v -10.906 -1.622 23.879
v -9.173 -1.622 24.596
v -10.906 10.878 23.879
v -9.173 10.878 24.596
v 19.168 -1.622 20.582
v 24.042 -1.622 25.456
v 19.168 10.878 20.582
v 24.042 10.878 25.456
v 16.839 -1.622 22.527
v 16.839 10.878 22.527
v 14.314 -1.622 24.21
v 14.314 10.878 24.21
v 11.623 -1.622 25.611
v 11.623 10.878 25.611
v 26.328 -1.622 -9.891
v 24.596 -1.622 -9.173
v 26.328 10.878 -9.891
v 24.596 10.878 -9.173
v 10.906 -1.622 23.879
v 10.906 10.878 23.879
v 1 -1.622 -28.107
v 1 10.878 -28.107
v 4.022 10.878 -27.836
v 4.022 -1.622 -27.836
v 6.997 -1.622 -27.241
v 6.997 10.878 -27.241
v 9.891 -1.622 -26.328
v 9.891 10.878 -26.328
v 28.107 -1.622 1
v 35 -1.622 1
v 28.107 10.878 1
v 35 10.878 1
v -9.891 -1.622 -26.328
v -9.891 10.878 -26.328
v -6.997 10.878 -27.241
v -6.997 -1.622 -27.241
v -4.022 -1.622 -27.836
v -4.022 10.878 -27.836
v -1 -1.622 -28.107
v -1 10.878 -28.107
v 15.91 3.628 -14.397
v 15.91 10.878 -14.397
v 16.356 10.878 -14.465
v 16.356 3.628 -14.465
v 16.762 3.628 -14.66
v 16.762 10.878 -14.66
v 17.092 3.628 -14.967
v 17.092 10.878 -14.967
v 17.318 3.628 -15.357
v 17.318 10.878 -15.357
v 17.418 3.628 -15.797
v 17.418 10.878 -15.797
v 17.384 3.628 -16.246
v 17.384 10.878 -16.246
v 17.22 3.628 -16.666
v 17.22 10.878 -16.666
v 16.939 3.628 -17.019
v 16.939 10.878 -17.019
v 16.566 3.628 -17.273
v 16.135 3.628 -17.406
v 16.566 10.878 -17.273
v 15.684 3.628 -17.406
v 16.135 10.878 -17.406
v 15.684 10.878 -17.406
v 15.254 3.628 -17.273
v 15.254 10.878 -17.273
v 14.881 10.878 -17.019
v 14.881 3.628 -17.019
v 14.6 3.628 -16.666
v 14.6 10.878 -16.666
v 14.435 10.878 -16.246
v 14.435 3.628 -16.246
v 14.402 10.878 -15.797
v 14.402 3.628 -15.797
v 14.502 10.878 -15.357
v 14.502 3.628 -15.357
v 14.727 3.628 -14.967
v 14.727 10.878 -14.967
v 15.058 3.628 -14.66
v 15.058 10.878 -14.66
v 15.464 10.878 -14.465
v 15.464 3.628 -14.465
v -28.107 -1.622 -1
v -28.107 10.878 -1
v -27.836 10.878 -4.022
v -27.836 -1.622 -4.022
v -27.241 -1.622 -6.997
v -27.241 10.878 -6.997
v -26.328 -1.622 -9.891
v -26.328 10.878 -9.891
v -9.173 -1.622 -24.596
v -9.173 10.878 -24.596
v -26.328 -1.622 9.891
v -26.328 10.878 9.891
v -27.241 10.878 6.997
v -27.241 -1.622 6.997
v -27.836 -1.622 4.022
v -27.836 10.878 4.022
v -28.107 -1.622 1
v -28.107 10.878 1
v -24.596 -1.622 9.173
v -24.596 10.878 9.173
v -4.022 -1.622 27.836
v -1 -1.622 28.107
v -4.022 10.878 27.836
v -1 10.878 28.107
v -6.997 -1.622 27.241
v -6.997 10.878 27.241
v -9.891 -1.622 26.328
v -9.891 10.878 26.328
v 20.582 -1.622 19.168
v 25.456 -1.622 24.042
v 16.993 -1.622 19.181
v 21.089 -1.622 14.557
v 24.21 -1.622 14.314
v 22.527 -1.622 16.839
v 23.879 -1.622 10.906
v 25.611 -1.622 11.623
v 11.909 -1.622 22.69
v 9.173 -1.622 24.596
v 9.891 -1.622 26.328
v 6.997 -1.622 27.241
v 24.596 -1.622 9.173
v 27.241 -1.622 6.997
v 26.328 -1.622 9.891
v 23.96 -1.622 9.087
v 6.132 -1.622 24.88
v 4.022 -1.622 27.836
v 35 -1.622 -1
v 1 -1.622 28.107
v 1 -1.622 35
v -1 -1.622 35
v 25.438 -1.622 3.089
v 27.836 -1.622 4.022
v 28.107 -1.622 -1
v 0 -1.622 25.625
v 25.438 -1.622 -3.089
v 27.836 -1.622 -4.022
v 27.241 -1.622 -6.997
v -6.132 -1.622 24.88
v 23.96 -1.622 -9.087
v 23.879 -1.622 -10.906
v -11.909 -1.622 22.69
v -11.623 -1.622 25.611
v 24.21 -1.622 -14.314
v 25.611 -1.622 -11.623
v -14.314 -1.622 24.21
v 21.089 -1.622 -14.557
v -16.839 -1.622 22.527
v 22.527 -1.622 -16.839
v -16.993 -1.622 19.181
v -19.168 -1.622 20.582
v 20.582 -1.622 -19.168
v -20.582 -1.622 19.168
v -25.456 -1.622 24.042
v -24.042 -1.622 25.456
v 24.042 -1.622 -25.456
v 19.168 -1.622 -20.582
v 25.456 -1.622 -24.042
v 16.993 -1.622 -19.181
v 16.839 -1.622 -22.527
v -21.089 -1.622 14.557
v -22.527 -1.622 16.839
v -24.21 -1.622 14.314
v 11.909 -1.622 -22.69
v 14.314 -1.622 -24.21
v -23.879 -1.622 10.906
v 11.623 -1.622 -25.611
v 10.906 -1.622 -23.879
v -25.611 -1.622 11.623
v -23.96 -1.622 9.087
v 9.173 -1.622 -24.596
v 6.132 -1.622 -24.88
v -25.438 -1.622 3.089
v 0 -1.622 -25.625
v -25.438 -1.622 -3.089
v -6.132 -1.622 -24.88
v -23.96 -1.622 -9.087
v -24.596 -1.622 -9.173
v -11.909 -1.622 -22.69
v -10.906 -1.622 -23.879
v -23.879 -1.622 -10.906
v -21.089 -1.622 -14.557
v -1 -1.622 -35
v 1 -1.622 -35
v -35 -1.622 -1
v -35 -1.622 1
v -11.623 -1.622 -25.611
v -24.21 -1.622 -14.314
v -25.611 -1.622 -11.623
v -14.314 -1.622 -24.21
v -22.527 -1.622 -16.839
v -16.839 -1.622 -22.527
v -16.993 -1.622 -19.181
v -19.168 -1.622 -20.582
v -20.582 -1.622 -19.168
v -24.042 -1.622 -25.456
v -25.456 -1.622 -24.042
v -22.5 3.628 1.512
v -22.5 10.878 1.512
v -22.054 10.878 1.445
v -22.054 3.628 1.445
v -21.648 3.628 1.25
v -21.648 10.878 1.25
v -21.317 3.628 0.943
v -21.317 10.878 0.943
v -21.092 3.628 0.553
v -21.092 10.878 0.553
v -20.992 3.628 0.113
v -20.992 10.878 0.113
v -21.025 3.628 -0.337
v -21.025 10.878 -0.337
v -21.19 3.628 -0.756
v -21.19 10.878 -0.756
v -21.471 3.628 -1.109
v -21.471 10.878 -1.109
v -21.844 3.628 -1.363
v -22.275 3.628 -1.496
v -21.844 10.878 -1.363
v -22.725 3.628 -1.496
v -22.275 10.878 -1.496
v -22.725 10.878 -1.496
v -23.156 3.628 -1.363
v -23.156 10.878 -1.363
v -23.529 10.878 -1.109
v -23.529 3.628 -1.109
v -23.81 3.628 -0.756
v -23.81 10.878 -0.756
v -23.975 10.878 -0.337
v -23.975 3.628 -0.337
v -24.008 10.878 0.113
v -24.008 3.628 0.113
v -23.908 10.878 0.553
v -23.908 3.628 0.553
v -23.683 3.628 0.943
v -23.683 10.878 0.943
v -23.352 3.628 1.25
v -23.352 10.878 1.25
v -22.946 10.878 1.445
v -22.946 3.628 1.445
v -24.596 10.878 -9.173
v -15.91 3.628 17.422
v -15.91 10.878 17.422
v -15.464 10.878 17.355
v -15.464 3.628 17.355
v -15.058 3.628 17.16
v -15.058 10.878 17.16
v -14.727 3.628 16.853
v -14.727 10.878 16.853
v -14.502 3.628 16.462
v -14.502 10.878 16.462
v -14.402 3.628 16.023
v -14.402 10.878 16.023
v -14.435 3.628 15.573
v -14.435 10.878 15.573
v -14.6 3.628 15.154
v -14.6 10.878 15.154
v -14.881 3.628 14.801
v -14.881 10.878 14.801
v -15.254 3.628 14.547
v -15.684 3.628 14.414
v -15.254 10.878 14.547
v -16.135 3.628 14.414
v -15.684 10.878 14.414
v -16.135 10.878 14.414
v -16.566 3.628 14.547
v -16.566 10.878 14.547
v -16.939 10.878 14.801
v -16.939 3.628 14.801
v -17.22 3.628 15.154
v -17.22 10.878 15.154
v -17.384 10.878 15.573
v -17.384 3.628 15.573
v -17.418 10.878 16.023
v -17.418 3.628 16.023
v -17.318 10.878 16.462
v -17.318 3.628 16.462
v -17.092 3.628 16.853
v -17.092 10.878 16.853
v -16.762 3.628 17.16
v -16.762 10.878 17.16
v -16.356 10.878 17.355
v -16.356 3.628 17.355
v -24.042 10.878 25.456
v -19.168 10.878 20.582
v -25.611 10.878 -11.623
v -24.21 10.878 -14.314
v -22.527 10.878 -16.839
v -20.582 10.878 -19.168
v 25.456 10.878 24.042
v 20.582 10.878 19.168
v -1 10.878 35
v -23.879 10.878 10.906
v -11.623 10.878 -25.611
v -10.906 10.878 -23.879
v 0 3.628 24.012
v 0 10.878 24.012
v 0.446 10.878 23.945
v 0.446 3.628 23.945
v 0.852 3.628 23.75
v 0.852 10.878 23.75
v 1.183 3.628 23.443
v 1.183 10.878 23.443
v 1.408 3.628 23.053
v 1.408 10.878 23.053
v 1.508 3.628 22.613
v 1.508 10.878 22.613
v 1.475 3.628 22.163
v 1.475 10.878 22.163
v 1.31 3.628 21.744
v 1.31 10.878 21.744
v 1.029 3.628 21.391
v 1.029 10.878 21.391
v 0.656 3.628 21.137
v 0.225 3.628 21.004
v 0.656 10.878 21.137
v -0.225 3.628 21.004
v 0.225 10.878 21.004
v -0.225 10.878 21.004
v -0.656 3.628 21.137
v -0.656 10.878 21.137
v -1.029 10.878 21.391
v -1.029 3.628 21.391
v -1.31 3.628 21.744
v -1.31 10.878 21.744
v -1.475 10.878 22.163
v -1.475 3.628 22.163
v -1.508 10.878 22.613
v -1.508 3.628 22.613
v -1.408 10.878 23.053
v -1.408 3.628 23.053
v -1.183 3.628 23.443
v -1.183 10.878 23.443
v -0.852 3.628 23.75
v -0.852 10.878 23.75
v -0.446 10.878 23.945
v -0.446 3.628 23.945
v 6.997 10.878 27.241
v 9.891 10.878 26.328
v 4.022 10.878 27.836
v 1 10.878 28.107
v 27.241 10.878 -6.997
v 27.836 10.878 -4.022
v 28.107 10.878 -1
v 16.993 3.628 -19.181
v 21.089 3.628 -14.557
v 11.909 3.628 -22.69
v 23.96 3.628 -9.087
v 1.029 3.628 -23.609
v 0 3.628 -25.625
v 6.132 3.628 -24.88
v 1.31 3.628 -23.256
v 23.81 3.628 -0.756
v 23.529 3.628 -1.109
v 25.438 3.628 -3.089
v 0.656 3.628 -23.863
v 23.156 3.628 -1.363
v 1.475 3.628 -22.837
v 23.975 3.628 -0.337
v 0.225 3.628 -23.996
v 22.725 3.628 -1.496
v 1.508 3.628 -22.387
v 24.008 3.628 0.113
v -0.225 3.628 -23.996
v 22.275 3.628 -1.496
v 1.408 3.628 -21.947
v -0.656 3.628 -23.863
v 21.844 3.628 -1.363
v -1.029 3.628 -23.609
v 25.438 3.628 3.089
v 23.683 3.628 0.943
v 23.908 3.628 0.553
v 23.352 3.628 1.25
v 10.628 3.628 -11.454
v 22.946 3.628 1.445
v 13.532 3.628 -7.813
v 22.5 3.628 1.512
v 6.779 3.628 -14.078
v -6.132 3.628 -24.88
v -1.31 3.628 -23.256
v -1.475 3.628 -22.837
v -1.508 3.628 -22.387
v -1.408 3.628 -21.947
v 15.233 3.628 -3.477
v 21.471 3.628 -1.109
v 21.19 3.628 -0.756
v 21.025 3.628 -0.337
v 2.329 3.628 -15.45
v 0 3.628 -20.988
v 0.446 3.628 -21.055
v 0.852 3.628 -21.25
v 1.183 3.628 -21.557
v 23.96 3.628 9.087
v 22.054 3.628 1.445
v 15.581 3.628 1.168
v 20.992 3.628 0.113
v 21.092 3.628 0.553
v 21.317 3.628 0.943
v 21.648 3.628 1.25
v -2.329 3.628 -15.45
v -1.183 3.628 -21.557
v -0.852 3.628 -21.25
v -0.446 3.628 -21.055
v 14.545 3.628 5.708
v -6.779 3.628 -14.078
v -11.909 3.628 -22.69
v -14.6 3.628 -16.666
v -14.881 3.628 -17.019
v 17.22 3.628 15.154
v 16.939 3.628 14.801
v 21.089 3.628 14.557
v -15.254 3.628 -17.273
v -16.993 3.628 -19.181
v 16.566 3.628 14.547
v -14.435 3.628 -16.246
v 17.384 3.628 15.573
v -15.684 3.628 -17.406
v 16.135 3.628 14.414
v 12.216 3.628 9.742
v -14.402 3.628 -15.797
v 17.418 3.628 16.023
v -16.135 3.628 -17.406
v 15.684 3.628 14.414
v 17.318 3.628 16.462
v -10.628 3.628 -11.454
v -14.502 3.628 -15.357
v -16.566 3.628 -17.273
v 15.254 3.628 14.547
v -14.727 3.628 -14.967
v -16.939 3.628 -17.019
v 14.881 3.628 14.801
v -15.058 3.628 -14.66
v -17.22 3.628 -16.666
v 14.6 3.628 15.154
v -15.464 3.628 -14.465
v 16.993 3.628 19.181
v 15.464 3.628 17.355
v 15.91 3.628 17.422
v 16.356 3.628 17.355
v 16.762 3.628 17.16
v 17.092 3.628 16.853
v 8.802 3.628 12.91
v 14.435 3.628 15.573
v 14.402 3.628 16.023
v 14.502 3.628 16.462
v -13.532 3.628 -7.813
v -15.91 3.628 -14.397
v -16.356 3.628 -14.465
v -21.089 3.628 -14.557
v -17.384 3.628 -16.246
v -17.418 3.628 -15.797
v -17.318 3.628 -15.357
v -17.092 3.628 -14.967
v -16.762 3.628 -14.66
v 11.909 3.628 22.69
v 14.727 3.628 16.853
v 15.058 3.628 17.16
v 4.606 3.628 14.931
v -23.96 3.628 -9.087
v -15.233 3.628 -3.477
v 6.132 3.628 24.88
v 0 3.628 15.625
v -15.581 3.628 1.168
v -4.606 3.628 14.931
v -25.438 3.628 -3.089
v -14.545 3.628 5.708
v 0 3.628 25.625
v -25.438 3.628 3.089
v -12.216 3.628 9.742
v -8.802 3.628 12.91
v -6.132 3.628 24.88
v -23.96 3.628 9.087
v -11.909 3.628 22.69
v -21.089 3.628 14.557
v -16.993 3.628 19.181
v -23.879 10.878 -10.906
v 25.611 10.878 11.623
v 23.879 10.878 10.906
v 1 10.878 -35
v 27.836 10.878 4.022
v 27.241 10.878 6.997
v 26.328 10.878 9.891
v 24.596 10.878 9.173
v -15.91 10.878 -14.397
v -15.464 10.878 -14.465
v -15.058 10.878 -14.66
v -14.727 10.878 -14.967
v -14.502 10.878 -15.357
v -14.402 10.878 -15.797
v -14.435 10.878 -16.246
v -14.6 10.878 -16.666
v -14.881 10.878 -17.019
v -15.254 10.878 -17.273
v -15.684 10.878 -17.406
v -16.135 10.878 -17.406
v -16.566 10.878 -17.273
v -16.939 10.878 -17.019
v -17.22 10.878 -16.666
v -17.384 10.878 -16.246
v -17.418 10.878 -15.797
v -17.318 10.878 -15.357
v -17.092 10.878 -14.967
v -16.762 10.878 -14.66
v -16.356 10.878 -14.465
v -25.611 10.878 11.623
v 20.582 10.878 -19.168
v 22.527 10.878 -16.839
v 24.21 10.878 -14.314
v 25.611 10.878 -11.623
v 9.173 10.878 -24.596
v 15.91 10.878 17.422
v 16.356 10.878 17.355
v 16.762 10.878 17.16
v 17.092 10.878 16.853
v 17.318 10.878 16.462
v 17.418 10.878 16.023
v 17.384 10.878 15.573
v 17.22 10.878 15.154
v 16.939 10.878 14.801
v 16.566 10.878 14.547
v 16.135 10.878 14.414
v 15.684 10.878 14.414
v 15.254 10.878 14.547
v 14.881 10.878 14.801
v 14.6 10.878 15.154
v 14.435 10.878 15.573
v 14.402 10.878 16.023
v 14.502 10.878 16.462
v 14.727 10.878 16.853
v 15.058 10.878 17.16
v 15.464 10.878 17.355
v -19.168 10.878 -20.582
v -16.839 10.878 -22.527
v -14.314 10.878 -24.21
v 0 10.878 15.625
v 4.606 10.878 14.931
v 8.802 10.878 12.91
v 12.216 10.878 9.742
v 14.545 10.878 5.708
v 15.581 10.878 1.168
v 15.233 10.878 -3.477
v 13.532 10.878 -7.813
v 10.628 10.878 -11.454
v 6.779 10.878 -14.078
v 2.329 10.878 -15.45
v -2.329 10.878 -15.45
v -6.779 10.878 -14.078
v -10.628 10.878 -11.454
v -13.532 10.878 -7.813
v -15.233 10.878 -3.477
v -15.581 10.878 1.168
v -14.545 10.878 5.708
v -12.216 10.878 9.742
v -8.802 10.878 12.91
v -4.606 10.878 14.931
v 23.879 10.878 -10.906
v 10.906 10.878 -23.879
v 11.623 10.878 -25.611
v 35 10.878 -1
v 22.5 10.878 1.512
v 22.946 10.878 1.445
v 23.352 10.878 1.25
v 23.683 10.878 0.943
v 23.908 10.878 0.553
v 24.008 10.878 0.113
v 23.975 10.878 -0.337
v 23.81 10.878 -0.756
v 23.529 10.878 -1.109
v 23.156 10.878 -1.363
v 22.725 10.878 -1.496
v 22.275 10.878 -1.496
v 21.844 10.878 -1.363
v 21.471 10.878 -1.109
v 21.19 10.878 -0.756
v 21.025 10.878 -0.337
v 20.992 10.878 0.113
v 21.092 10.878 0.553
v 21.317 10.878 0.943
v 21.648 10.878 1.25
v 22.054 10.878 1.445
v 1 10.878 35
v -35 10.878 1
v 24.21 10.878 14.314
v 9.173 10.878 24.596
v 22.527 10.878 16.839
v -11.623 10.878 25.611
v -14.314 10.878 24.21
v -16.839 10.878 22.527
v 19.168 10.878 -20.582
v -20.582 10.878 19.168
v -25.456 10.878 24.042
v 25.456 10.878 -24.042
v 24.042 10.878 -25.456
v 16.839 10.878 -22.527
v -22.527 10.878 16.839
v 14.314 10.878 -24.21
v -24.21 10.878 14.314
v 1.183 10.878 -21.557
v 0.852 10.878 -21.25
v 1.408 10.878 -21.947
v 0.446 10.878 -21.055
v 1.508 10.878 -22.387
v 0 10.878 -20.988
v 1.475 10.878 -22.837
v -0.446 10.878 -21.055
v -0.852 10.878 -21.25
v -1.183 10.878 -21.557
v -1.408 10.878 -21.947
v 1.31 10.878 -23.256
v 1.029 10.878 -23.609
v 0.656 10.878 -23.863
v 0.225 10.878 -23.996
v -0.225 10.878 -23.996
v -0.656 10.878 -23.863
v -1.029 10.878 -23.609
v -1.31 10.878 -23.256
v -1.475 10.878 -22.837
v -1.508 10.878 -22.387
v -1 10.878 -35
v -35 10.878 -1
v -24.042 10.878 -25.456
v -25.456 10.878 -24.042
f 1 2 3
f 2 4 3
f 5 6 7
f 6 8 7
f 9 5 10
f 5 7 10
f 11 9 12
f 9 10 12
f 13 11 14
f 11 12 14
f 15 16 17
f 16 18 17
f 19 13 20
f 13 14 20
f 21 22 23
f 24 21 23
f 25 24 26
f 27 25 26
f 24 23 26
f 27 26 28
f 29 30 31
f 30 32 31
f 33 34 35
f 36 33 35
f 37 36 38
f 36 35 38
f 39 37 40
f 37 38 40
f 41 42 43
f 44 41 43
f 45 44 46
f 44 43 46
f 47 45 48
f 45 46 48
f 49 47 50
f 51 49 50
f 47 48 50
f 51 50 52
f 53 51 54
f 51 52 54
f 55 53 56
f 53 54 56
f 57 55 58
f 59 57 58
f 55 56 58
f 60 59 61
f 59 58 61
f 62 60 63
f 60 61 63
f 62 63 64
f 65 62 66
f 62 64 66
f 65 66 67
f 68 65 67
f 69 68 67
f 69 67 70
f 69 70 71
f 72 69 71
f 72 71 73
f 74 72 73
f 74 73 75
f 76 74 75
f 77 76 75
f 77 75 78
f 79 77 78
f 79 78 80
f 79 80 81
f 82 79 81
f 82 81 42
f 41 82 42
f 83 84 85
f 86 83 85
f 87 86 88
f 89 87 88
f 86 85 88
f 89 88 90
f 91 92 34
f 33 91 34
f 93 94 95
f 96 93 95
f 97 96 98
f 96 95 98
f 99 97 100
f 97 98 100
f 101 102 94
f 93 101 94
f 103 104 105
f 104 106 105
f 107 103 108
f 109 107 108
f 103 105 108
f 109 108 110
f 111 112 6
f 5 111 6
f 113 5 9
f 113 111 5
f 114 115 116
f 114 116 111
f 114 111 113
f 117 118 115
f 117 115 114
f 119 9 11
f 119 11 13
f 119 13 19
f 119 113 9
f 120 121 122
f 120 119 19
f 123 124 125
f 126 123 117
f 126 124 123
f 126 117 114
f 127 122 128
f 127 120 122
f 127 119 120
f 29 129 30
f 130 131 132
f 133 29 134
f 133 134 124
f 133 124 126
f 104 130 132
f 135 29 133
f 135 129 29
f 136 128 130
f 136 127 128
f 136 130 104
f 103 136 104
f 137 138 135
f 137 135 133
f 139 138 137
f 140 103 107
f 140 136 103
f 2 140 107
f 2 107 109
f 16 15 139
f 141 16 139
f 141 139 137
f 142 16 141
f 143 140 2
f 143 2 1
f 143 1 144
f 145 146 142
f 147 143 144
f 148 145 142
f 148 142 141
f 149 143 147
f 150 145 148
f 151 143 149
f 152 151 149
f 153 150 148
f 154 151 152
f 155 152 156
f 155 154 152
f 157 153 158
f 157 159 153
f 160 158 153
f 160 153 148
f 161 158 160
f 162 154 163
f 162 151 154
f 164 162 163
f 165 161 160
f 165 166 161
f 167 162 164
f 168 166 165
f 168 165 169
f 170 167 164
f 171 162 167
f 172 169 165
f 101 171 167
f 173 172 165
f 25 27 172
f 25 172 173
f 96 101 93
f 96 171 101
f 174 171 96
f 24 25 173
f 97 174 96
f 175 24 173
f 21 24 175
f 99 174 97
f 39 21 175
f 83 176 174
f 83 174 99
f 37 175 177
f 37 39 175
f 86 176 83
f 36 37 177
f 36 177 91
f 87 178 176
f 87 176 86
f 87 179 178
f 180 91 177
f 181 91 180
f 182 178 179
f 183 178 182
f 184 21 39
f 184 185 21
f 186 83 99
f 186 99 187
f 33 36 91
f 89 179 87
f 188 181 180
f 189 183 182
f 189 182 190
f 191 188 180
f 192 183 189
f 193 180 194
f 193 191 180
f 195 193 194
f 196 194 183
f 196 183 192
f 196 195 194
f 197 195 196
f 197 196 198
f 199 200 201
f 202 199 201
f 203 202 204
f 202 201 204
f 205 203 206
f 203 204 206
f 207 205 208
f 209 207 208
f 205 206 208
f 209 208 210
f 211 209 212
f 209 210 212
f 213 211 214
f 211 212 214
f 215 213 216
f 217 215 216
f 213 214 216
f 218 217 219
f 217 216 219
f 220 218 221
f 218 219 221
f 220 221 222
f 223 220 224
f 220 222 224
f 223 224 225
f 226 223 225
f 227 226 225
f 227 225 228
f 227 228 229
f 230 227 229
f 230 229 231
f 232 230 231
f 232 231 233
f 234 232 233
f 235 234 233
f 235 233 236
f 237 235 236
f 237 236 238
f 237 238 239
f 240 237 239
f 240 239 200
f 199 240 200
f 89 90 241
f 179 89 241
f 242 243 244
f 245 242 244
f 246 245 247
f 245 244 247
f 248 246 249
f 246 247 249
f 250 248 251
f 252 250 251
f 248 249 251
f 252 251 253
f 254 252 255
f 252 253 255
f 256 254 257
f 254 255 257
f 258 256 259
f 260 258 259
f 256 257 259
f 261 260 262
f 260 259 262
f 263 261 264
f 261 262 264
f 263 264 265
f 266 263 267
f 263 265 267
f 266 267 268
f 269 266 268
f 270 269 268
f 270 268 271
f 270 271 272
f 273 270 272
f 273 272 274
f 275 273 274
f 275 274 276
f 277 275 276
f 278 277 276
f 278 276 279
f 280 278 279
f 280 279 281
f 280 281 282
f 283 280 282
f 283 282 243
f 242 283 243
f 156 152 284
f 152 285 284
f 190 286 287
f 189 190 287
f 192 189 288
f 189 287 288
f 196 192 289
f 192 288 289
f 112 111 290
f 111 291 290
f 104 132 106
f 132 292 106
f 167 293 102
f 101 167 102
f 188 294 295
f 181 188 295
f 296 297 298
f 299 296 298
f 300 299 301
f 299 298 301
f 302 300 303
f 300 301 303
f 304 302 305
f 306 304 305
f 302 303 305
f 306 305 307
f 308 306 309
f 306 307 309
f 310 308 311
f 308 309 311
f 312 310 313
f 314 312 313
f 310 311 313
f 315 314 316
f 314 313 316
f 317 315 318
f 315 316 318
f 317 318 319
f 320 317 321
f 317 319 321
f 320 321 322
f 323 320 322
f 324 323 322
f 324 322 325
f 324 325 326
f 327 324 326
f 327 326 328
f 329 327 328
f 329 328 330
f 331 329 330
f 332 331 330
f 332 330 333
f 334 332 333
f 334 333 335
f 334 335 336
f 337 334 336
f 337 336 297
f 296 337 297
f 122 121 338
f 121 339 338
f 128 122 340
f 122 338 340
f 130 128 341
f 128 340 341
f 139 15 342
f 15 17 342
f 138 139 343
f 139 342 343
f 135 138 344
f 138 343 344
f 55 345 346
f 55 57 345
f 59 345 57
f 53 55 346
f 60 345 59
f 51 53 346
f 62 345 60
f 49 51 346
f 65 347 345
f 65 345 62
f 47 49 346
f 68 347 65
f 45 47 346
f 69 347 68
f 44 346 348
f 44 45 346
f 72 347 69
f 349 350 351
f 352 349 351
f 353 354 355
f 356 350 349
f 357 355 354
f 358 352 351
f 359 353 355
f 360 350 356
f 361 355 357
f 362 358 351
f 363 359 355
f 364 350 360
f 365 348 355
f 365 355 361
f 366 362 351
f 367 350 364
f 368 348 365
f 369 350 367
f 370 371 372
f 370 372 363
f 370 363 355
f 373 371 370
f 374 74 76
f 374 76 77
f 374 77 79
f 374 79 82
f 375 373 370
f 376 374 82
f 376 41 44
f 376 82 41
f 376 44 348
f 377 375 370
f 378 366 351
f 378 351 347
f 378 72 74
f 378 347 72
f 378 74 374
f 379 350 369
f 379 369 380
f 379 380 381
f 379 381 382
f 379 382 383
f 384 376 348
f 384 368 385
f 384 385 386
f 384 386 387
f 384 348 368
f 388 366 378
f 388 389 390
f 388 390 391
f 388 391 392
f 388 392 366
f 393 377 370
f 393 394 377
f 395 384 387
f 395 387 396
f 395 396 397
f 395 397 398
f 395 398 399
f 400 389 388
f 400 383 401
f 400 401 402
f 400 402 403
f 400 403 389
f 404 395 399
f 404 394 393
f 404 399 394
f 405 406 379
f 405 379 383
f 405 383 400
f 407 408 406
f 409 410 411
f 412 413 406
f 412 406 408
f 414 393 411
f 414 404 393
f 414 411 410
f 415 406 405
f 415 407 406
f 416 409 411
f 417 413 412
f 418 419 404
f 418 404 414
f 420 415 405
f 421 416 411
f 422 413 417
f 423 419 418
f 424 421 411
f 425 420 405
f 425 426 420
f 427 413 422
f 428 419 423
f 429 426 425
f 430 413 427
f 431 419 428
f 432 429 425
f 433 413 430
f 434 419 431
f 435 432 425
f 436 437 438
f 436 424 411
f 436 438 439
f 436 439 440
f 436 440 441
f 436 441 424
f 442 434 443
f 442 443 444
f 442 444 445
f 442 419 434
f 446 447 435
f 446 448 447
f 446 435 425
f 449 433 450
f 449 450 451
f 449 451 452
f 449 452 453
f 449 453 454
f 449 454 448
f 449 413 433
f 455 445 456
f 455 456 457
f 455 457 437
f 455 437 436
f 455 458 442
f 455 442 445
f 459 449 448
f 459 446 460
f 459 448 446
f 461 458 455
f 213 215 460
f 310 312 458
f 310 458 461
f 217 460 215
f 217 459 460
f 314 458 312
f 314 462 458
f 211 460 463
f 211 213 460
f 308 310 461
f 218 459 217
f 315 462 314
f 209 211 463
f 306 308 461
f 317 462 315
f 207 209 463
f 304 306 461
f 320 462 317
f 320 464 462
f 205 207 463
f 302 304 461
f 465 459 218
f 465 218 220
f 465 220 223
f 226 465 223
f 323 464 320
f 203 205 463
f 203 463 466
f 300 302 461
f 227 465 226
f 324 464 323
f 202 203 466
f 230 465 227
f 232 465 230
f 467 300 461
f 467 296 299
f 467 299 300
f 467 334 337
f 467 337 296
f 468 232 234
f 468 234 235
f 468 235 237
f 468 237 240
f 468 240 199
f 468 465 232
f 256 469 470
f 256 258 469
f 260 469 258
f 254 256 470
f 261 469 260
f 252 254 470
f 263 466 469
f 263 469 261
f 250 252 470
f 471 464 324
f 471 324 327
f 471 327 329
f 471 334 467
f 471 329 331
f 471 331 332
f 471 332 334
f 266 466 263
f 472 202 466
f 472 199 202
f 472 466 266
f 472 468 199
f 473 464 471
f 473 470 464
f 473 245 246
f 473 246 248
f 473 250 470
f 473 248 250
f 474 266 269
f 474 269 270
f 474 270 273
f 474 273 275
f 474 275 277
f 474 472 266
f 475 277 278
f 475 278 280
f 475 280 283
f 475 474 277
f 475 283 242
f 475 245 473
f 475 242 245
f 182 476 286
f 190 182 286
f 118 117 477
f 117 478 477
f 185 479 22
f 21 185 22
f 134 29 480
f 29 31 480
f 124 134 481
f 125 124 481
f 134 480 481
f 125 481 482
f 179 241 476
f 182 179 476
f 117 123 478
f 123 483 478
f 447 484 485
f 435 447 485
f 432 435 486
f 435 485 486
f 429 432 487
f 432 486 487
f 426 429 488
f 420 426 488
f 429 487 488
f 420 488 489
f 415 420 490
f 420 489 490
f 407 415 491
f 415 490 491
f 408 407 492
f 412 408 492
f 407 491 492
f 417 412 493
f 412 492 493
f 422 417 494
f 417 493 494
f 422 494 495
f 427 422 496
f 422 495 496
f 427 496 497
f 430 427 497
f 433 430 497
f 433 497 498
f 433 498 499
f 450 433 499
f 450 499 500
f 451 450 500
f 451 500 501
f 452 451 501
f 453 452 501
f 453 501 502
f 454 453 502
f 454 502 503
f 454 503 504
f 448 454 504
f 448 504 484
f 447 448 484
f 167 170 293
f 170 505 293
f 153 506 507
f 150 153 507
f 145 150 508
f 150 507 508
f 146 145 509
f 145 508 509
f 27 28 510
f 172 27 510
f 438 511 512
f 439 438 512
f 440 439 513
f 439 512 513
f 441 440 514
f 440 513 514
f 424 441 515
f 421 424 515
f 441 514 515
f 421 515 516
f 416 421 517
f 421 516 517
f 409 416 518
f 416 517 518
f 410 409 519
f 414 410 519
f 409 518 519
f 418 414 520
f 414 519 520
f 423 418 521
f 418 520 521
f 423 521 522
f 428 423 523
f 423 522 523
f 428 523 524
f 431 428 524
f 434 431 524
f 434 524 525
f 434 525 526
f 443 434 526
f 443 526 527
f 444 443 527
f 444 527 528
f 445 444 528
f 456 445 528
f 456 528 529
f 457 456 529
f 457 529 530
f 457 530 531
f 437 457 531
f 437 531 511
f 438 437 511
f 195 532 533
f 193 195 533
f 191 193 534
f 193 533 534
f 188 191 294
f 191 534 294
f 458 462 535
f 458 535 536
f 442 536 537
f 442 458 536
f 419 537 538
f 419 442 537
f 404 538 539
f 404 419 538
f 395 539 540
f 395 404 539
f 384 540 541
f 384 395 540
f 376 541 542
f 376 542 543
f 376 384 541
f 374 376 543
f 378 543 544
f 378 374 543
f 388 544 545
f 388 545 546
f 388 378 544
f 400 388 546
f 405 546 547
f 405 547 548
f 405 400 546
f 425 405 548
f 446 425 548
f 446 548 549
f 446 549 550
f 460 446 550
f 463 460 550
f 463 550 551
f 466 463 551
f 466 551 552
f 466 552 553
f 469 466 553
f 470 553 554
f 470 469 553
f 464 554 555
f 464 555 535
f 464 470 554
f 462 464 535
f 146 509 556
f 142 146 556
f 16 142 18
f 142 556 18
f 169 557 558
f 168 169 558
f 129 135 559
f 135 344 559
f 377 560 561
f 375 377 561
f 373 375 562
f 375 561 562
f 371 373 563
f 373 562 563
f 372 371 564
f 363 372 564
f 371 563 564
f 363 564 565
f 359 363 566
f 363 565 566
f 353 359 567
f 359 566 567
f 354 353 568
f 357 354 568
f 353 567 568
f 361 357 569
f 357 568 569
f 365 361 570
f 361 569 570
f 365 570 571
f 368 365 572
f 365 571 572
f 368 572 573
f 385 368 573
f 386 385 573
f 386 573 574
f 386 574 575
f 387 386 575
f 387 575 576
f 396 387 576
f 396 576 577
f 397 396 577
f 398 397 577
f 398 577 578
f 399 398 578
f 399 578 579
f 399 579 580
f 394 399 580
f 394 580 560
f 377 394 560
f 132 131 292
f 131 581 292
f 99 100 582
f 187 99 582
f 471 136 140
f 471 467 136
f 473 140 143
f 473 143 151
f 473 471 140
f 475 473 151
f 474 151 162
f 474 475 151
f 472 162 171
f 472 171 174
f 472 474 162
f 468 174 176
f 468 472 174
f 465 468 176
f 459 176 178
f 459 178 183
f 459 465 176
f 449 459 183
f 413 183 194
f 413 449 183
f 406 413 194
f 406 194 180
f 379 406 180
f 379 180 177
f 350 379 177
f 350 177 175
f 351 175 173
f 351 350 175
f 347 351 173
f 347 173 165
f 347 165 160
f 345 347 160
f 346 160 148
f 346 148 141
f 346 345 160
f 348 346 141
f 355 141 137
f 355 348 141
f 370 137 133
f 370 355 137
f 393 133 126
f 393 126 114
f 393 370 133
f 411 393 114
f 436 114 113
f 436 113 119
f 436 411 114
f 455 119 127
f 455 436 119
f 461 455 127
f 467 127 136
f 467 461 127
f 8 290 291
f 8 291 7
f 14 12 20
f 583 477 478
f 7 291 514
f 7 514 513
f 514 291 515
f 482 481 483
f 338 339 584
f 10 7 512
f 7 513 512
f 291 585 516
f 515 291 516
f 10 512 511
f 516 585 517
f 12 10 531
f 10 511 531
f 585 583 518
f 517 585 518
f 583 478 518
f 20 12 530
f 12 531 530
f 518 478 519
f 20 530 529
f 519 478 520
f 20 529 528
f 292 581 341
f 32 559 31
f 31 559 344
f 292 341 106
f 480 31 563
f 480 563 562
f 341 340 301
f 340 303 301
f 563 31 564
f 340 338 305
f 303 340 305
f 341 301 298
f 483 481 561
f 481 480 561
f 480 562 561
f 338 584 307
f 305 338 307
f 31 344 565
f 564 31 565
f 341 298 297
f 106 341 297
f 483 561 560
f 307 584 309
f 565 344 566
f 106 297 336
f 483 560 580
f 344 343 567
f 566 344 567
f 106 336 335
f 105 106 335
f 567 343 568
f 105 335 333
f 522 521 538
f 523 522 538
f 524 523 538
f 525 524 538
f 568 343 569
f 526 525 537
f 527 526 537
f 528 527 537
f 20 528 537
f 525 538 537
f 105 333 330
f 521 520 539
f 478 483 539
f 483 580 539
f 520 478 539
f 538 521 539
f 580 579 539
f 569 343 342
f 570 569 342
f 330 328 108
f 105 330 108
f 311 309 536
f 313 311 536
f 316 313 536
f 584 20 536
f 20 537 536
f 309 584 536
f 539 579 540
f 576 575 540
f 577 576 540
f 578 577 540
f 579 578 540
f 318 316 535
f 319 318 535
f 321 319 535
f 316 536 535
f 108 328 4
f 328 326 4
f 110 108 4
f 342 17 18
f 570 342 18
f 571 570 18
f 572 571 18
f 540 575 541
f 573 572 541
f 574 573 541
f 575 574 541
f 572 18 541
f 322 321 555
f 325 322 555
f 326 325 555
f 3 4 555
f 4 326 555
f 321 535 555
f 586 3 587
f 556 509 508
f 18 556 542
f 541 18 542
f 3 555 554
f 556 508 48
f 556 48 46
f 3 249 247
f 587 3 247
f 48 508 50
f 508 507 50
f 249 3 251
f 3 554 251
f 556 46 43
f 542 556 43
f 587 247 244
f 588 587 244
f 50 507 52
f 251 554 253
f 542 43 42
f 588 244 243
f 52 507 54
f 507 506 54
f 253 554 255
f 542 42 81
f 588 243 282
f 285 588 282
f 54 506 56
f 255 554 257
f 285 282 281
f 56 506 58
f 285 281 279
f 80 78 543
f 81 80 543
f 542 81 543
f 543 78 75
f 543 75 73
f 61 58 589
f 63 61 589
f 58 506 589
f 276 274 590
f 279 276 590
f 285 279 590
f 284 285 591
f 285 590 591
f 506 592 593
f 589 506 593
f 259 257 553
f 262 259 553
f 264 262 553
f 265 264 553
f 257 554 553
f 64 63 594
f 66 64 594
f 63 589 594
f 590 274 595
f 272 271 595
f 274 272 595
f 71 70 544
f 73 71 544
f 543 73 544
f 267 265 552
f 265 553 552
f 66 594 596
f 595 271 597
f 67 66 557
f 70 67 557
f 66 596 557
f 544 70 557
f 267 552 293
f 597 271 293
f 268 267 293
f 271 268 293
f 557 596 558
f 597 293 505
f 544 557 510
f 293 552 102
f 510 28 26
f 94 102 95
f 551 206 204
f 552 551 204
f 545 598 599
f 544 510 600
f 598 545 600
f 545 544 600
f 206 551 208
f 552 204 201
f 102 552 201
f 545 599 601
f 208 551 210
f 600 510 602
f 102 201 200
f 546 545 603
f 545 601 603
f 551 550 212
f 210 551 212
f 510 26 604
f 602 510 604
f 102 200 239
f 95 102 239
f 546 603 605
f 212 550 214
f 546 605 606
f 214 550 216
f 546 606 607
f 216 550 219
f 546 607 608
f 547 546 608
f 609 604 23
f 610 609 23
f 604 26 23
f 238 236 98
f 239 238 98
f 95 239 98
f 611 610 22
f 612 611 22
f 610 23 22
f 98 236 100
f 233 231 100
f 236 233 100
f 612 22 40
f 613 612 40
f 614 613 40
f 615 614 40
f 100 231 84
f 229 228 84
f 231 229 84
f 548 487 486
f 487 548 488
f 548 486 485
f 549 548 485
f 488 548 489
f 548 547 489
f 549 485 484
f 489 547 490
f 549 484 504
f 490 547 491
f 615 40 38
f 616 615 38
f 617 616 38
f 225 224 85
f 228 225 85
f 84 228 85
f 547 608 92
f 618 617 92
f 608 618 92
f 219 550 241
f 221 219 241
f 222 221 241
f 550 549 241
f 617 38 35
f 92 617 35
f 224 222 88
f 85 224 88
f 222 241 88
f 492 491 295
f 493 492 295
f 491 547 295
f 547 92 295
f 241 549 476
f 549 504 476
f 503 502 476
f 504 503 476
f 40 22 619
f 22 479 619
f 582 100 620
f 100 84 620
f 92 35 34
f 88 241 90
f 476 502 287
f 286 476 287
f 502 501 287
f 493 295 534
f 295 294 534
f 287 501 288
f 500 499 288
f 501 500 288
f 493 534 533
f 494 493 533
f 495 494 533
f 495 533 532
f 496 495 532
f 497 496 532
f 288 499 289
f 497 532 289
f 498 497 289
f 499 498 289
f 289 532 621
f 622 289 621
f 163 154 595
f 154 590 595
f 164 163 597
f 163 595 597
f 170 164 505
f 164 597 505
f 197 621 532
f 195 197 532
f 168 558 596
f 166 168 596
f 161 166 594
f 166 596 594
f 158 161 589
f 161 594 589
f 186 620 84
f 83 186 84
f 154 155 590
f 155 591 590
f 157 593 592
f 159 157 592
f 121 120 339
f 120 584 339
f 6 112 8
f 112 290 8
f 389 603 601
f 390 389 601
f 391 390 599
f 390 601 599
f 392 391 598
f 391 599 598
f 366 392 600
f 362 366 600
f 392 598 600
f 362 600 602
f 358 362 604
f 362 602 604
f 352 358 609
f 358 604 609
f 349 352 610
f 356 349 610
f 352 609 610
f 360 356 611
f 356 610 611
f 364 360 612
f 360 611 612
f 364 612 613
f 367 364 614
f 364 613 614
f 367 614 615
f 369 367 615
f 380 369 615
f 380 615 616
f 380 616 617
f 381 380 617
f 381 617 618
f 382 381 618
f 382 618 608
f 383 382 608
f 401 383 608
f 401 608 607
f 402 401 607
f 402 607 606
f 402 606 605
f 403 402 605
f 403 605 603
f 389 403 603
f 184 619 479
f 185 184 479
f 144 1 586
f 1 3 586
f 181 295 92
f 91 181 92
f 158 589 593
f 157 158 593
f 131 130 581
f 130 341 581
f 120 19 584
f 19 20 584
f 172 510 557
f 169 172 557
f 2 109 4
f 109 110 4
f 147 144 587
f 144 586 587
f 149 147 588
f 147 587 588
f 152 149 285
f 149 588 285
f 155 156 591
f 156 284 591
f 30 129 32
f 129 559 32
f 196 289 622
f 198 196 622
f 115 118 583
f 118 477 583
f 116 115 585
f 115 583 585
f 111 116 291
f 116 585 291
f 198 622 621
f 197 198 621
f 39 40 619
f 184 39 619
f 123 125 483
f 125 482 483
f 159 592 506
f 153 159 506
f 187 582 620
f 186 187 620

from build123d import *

# Parameters (mm, degrees)
SKETCH1_R           = 62.5
BOSS_EXTRUDE1_DEPTH = 25
SKETCH3_W           = 40
SKETCH3_H           = 21
SKETCH7_R           = 6.05
CUT_EXTRUDE1_DEPTH  = 205.205778567
SCALE1_SCALE        = 0.25


with BuildPart() as part:
    # Sketch1 → Boss-Extrude1 (new, symmetric)
    with BuildSketch(Plane(origin=(0, 0, 0), x_dir=(1, 0, 0), z_dir=(0, 1, 0))):
        with BuildLine():
            Line((95.514529523, 43.622384283), (102.443626017, 46.492510026))
            ThreePointArc((102.443626017, 46.492510026), (93.609761087, 62.397617177), (82.327640957, 76.670786708))
            Line((82.327640957, 76.670786708), (101.823376491, 96.166522241))
            Line((101.823376491, 96.166522241), (96.166522241, 101.823376491))
            Line((96.166522241, 101.823376491), (76.670786708, 82.327640957))
            ThreePointArc((76.670786708, 82.327640957), (62.397617177, 93.609761087), (46.492510026, 102.443626017))
            Line((46.492510026, 102.443626017), (43.622384283, 95.514529523))
            Line((43.622384283, 95.514529523), (36.693287789, 98.384655266))
            Line((36.693287789, 98.384655266), (39.563413532, 105.31375176))
            ThreePointArc((39.563413532, 105.31375176), (22.070318614, 110.313875085), (4, 112.4288664))
            Line((4, 112.4288664), (4, 140))
            Line((4, 140), (-4, 140))
            Line((-4, 140), (-4, 112.4288664))
            ThreePointArc((-4, 112.4288664), (-22.070318614, 110.313875085), (-39.563413532, 105.31375176))
            Line((-39.563413532, 105.31375176), (-36.693287789, 98.384655266))
            Line((-36.693287789, 98.384655266), (-43.622384283, 95.514529523))
            Line((-43.622384283, 95.514529523), (-46.492510026, 102.443626017))
            ThreePointArc((-46.492510026, 102.443626017), (-62.397617177, 93.609761087), (-76.670786708, 82.327640957))
            Line((-76.670786708, 82.327640957), (-96.166522241, 101.823376491))
            Line((-96.166522241, 101.823376491), (-101.823376491, 96.166522241))
            Line((-101.823376491, 96.166522241), (-82.327640957, 76.670786708))
            ThreePointArc((-82.327640957, 76.670786708), (-93.609761087, 62.397617177), (-102.443626017, 46.492510026))
            Line((-102.443626017, 46.492510026), (-95.514529523, 43.622384283))
            Line((-95.514529523, 43.622384283), (-98.384655266, 36.693287789))
            Line((-98.384655266, 36.693287789), (-105.31375176, 39.563413532))
            ThreePointArc((-105.31375176, 39.563413532), (-110.313875085, 22.070318614), (-112.4288664, 4))
            Line((-112.4288664, 4), (-140, 4))
            Line((-140, 4), (-140, -4))
            Line((-140, -4), (-112.4288664, -4))
            ThreePointArc((-112.4288664, -4), (-110.313875085, -22.070318614), (-105.31375176, -39.563413532))
            Line((-105.31375176, -39.563413532), (-98.384655266, -36.693287789))
            Line((-98.384655266, -36.693287789), (-95.514529523, -43.622384283))
            Line((-95.514529523, -43.622384283), (-102.443626017, -46.492510026))
            ThreePointArc((-102.443626017, -46.492510026), (-93.609761087, -62.397617177), (-82.327640957, -76.670786708))
            Line((-82.327640957, -76.670786708), (-101.823376491, -96.166522241))
            Line((-101.823376491, -96.166522241), (-96.166522241, -101.823376491))
            Line((-96.166522241, -101.823376491), (-76.670786708, -82.327640957))
            ThreePointArc((-76.670786708, -82.327640957), (-62.397617177, -93.609761087), (-46.492510026, -102.443626017))
            Line((-46.492510026, -102.443626017), (-43.622384283, -95.514529523))
            Line((-43.622384283, -95.514529523), (-36.693287789, -98.384655266))
            Line((-36.693287789, -98.384655266), (-39.563413532, -105.31375176))
            ThreePointArc((-39.563413532, -105.31375176), (-22.070318614, -110.313875085), (-4, -112.4288664))
            Line((-4, -112.4288664), (-4, -140))
            Line((-4, -140), (4, -140))
            Line((4, -140), (4, -112.4288664))
            ThreePointArc((4, -112.4288664), (22.070318614, -110.313875085), (39.563413532, -105.31375176))
            Line((39.563413532, -105.31375176), (36.693287789, -98.384655266))
            Line((36.693287789, -98.384655266), (43.622384283, -95.514529523))
            Line((43.622384283, -95.514529523), (46.492510026, -102.443626017))
            ThreePointArc((46.492510026, -102.443626017), (62.397617177, -93.609761087), (76.670786708, -82.327640957))
            Line((76.670786708, -82.327640957), (96.166522241, -101.823376491))
            Line((96.166522241, -101.823376491), (101.823376491, -96.166522241))
            Line((101.823376491, -96.166522241), (82.327640957, -76.670786708))
            ThreePointArc((82.327640957, -76.670786708), (93.609761087, -62.397617177), (102.443626017, -46.492510026))
            Line((102.443626017, -46.492510026), (95.514529523, -43.622384283))
            Line((95.514529523, -43.622384283), (98.384655266, -36.693287789))
            Line((98.384655266, -36.693287789), (105.31375176, -39.563413532))
            ThreePointArc((105.31375176, -39.563413532), (110.313875085, -22.070318614), (112.4288664, -4))
            Line((112.4288664, -4), (140, -4))
            Line((140, -4), (140, 4))
            Line((140, 4), (112.4288664, 4))
            ThreePointArc((112.4288664, 4), (110.313875085, 22.070318614), (105.31375176, 39.563413532))
            Line((105.31375176, 39.563413532), (98.384655266, 36.693287789))
            Line((98.384655266, 36.693287789), (95.514529523, 43.622384283))
        make_face()
        Circle(SKETCH1_R, mode=Mode.SUBTRACT)
    extrude(amount=BOSS_EXTRUDE1_DEPTH, both=True)

    # Sketch3 → Cut-Revolve1 (revolve, cut)
    with BuildSketch(Plane.XY):
        with Locations((-82.5, -14.5)):
            Rectangle(SKETCH3_W, SKETCH3_H)
    revolve(axis=Axis((0, 65.266274402, 0), (0, -1, 0)), mode=Mode.SUBTRACT)

    # Sketch7 → Cut-Extrude1 (cut, through all)
    with BuildSketch(Plane(origin=(0, 25, 0), x_dir=(1, 0, 0), z_dir=(0, 1, 0))):
        with Locations((0, 90)):
            Circle(SKETCH7_R)
        with Locations((63.639610307, 63.639610307)):
            Circle(SKETCH7_R)
        with Locations((90, 0)):
            Circle(SKETCH7_R)
        with Locations((63.639610307, -63.639610307)):
            Circle(SKETCH7_R)
        with Locations((0, -90)):
            Circle(SKETCH7_R)
        with Locations((-63.639610307, -63.639610307)):
            Circle(SKETCH7_R)
        with Locations((-90, 0)):
            Circle(SKETCH7_R)
        with Locations((-63.639610307, 63.639610307)):
            Circle(SKETCH7_R)
    extrude(amount=-CUT_EXTRUDE1_DEPTH, mode=Mode.SUBTRACT)


with BuildPart() as part_1:
    # Scale1: scaled about (0, 6.17055907, 0)
    add(part.part.scale(SCALE1_SCALE).moved(Location((0, 4.627919303, 0))))


solid = part_1.part
